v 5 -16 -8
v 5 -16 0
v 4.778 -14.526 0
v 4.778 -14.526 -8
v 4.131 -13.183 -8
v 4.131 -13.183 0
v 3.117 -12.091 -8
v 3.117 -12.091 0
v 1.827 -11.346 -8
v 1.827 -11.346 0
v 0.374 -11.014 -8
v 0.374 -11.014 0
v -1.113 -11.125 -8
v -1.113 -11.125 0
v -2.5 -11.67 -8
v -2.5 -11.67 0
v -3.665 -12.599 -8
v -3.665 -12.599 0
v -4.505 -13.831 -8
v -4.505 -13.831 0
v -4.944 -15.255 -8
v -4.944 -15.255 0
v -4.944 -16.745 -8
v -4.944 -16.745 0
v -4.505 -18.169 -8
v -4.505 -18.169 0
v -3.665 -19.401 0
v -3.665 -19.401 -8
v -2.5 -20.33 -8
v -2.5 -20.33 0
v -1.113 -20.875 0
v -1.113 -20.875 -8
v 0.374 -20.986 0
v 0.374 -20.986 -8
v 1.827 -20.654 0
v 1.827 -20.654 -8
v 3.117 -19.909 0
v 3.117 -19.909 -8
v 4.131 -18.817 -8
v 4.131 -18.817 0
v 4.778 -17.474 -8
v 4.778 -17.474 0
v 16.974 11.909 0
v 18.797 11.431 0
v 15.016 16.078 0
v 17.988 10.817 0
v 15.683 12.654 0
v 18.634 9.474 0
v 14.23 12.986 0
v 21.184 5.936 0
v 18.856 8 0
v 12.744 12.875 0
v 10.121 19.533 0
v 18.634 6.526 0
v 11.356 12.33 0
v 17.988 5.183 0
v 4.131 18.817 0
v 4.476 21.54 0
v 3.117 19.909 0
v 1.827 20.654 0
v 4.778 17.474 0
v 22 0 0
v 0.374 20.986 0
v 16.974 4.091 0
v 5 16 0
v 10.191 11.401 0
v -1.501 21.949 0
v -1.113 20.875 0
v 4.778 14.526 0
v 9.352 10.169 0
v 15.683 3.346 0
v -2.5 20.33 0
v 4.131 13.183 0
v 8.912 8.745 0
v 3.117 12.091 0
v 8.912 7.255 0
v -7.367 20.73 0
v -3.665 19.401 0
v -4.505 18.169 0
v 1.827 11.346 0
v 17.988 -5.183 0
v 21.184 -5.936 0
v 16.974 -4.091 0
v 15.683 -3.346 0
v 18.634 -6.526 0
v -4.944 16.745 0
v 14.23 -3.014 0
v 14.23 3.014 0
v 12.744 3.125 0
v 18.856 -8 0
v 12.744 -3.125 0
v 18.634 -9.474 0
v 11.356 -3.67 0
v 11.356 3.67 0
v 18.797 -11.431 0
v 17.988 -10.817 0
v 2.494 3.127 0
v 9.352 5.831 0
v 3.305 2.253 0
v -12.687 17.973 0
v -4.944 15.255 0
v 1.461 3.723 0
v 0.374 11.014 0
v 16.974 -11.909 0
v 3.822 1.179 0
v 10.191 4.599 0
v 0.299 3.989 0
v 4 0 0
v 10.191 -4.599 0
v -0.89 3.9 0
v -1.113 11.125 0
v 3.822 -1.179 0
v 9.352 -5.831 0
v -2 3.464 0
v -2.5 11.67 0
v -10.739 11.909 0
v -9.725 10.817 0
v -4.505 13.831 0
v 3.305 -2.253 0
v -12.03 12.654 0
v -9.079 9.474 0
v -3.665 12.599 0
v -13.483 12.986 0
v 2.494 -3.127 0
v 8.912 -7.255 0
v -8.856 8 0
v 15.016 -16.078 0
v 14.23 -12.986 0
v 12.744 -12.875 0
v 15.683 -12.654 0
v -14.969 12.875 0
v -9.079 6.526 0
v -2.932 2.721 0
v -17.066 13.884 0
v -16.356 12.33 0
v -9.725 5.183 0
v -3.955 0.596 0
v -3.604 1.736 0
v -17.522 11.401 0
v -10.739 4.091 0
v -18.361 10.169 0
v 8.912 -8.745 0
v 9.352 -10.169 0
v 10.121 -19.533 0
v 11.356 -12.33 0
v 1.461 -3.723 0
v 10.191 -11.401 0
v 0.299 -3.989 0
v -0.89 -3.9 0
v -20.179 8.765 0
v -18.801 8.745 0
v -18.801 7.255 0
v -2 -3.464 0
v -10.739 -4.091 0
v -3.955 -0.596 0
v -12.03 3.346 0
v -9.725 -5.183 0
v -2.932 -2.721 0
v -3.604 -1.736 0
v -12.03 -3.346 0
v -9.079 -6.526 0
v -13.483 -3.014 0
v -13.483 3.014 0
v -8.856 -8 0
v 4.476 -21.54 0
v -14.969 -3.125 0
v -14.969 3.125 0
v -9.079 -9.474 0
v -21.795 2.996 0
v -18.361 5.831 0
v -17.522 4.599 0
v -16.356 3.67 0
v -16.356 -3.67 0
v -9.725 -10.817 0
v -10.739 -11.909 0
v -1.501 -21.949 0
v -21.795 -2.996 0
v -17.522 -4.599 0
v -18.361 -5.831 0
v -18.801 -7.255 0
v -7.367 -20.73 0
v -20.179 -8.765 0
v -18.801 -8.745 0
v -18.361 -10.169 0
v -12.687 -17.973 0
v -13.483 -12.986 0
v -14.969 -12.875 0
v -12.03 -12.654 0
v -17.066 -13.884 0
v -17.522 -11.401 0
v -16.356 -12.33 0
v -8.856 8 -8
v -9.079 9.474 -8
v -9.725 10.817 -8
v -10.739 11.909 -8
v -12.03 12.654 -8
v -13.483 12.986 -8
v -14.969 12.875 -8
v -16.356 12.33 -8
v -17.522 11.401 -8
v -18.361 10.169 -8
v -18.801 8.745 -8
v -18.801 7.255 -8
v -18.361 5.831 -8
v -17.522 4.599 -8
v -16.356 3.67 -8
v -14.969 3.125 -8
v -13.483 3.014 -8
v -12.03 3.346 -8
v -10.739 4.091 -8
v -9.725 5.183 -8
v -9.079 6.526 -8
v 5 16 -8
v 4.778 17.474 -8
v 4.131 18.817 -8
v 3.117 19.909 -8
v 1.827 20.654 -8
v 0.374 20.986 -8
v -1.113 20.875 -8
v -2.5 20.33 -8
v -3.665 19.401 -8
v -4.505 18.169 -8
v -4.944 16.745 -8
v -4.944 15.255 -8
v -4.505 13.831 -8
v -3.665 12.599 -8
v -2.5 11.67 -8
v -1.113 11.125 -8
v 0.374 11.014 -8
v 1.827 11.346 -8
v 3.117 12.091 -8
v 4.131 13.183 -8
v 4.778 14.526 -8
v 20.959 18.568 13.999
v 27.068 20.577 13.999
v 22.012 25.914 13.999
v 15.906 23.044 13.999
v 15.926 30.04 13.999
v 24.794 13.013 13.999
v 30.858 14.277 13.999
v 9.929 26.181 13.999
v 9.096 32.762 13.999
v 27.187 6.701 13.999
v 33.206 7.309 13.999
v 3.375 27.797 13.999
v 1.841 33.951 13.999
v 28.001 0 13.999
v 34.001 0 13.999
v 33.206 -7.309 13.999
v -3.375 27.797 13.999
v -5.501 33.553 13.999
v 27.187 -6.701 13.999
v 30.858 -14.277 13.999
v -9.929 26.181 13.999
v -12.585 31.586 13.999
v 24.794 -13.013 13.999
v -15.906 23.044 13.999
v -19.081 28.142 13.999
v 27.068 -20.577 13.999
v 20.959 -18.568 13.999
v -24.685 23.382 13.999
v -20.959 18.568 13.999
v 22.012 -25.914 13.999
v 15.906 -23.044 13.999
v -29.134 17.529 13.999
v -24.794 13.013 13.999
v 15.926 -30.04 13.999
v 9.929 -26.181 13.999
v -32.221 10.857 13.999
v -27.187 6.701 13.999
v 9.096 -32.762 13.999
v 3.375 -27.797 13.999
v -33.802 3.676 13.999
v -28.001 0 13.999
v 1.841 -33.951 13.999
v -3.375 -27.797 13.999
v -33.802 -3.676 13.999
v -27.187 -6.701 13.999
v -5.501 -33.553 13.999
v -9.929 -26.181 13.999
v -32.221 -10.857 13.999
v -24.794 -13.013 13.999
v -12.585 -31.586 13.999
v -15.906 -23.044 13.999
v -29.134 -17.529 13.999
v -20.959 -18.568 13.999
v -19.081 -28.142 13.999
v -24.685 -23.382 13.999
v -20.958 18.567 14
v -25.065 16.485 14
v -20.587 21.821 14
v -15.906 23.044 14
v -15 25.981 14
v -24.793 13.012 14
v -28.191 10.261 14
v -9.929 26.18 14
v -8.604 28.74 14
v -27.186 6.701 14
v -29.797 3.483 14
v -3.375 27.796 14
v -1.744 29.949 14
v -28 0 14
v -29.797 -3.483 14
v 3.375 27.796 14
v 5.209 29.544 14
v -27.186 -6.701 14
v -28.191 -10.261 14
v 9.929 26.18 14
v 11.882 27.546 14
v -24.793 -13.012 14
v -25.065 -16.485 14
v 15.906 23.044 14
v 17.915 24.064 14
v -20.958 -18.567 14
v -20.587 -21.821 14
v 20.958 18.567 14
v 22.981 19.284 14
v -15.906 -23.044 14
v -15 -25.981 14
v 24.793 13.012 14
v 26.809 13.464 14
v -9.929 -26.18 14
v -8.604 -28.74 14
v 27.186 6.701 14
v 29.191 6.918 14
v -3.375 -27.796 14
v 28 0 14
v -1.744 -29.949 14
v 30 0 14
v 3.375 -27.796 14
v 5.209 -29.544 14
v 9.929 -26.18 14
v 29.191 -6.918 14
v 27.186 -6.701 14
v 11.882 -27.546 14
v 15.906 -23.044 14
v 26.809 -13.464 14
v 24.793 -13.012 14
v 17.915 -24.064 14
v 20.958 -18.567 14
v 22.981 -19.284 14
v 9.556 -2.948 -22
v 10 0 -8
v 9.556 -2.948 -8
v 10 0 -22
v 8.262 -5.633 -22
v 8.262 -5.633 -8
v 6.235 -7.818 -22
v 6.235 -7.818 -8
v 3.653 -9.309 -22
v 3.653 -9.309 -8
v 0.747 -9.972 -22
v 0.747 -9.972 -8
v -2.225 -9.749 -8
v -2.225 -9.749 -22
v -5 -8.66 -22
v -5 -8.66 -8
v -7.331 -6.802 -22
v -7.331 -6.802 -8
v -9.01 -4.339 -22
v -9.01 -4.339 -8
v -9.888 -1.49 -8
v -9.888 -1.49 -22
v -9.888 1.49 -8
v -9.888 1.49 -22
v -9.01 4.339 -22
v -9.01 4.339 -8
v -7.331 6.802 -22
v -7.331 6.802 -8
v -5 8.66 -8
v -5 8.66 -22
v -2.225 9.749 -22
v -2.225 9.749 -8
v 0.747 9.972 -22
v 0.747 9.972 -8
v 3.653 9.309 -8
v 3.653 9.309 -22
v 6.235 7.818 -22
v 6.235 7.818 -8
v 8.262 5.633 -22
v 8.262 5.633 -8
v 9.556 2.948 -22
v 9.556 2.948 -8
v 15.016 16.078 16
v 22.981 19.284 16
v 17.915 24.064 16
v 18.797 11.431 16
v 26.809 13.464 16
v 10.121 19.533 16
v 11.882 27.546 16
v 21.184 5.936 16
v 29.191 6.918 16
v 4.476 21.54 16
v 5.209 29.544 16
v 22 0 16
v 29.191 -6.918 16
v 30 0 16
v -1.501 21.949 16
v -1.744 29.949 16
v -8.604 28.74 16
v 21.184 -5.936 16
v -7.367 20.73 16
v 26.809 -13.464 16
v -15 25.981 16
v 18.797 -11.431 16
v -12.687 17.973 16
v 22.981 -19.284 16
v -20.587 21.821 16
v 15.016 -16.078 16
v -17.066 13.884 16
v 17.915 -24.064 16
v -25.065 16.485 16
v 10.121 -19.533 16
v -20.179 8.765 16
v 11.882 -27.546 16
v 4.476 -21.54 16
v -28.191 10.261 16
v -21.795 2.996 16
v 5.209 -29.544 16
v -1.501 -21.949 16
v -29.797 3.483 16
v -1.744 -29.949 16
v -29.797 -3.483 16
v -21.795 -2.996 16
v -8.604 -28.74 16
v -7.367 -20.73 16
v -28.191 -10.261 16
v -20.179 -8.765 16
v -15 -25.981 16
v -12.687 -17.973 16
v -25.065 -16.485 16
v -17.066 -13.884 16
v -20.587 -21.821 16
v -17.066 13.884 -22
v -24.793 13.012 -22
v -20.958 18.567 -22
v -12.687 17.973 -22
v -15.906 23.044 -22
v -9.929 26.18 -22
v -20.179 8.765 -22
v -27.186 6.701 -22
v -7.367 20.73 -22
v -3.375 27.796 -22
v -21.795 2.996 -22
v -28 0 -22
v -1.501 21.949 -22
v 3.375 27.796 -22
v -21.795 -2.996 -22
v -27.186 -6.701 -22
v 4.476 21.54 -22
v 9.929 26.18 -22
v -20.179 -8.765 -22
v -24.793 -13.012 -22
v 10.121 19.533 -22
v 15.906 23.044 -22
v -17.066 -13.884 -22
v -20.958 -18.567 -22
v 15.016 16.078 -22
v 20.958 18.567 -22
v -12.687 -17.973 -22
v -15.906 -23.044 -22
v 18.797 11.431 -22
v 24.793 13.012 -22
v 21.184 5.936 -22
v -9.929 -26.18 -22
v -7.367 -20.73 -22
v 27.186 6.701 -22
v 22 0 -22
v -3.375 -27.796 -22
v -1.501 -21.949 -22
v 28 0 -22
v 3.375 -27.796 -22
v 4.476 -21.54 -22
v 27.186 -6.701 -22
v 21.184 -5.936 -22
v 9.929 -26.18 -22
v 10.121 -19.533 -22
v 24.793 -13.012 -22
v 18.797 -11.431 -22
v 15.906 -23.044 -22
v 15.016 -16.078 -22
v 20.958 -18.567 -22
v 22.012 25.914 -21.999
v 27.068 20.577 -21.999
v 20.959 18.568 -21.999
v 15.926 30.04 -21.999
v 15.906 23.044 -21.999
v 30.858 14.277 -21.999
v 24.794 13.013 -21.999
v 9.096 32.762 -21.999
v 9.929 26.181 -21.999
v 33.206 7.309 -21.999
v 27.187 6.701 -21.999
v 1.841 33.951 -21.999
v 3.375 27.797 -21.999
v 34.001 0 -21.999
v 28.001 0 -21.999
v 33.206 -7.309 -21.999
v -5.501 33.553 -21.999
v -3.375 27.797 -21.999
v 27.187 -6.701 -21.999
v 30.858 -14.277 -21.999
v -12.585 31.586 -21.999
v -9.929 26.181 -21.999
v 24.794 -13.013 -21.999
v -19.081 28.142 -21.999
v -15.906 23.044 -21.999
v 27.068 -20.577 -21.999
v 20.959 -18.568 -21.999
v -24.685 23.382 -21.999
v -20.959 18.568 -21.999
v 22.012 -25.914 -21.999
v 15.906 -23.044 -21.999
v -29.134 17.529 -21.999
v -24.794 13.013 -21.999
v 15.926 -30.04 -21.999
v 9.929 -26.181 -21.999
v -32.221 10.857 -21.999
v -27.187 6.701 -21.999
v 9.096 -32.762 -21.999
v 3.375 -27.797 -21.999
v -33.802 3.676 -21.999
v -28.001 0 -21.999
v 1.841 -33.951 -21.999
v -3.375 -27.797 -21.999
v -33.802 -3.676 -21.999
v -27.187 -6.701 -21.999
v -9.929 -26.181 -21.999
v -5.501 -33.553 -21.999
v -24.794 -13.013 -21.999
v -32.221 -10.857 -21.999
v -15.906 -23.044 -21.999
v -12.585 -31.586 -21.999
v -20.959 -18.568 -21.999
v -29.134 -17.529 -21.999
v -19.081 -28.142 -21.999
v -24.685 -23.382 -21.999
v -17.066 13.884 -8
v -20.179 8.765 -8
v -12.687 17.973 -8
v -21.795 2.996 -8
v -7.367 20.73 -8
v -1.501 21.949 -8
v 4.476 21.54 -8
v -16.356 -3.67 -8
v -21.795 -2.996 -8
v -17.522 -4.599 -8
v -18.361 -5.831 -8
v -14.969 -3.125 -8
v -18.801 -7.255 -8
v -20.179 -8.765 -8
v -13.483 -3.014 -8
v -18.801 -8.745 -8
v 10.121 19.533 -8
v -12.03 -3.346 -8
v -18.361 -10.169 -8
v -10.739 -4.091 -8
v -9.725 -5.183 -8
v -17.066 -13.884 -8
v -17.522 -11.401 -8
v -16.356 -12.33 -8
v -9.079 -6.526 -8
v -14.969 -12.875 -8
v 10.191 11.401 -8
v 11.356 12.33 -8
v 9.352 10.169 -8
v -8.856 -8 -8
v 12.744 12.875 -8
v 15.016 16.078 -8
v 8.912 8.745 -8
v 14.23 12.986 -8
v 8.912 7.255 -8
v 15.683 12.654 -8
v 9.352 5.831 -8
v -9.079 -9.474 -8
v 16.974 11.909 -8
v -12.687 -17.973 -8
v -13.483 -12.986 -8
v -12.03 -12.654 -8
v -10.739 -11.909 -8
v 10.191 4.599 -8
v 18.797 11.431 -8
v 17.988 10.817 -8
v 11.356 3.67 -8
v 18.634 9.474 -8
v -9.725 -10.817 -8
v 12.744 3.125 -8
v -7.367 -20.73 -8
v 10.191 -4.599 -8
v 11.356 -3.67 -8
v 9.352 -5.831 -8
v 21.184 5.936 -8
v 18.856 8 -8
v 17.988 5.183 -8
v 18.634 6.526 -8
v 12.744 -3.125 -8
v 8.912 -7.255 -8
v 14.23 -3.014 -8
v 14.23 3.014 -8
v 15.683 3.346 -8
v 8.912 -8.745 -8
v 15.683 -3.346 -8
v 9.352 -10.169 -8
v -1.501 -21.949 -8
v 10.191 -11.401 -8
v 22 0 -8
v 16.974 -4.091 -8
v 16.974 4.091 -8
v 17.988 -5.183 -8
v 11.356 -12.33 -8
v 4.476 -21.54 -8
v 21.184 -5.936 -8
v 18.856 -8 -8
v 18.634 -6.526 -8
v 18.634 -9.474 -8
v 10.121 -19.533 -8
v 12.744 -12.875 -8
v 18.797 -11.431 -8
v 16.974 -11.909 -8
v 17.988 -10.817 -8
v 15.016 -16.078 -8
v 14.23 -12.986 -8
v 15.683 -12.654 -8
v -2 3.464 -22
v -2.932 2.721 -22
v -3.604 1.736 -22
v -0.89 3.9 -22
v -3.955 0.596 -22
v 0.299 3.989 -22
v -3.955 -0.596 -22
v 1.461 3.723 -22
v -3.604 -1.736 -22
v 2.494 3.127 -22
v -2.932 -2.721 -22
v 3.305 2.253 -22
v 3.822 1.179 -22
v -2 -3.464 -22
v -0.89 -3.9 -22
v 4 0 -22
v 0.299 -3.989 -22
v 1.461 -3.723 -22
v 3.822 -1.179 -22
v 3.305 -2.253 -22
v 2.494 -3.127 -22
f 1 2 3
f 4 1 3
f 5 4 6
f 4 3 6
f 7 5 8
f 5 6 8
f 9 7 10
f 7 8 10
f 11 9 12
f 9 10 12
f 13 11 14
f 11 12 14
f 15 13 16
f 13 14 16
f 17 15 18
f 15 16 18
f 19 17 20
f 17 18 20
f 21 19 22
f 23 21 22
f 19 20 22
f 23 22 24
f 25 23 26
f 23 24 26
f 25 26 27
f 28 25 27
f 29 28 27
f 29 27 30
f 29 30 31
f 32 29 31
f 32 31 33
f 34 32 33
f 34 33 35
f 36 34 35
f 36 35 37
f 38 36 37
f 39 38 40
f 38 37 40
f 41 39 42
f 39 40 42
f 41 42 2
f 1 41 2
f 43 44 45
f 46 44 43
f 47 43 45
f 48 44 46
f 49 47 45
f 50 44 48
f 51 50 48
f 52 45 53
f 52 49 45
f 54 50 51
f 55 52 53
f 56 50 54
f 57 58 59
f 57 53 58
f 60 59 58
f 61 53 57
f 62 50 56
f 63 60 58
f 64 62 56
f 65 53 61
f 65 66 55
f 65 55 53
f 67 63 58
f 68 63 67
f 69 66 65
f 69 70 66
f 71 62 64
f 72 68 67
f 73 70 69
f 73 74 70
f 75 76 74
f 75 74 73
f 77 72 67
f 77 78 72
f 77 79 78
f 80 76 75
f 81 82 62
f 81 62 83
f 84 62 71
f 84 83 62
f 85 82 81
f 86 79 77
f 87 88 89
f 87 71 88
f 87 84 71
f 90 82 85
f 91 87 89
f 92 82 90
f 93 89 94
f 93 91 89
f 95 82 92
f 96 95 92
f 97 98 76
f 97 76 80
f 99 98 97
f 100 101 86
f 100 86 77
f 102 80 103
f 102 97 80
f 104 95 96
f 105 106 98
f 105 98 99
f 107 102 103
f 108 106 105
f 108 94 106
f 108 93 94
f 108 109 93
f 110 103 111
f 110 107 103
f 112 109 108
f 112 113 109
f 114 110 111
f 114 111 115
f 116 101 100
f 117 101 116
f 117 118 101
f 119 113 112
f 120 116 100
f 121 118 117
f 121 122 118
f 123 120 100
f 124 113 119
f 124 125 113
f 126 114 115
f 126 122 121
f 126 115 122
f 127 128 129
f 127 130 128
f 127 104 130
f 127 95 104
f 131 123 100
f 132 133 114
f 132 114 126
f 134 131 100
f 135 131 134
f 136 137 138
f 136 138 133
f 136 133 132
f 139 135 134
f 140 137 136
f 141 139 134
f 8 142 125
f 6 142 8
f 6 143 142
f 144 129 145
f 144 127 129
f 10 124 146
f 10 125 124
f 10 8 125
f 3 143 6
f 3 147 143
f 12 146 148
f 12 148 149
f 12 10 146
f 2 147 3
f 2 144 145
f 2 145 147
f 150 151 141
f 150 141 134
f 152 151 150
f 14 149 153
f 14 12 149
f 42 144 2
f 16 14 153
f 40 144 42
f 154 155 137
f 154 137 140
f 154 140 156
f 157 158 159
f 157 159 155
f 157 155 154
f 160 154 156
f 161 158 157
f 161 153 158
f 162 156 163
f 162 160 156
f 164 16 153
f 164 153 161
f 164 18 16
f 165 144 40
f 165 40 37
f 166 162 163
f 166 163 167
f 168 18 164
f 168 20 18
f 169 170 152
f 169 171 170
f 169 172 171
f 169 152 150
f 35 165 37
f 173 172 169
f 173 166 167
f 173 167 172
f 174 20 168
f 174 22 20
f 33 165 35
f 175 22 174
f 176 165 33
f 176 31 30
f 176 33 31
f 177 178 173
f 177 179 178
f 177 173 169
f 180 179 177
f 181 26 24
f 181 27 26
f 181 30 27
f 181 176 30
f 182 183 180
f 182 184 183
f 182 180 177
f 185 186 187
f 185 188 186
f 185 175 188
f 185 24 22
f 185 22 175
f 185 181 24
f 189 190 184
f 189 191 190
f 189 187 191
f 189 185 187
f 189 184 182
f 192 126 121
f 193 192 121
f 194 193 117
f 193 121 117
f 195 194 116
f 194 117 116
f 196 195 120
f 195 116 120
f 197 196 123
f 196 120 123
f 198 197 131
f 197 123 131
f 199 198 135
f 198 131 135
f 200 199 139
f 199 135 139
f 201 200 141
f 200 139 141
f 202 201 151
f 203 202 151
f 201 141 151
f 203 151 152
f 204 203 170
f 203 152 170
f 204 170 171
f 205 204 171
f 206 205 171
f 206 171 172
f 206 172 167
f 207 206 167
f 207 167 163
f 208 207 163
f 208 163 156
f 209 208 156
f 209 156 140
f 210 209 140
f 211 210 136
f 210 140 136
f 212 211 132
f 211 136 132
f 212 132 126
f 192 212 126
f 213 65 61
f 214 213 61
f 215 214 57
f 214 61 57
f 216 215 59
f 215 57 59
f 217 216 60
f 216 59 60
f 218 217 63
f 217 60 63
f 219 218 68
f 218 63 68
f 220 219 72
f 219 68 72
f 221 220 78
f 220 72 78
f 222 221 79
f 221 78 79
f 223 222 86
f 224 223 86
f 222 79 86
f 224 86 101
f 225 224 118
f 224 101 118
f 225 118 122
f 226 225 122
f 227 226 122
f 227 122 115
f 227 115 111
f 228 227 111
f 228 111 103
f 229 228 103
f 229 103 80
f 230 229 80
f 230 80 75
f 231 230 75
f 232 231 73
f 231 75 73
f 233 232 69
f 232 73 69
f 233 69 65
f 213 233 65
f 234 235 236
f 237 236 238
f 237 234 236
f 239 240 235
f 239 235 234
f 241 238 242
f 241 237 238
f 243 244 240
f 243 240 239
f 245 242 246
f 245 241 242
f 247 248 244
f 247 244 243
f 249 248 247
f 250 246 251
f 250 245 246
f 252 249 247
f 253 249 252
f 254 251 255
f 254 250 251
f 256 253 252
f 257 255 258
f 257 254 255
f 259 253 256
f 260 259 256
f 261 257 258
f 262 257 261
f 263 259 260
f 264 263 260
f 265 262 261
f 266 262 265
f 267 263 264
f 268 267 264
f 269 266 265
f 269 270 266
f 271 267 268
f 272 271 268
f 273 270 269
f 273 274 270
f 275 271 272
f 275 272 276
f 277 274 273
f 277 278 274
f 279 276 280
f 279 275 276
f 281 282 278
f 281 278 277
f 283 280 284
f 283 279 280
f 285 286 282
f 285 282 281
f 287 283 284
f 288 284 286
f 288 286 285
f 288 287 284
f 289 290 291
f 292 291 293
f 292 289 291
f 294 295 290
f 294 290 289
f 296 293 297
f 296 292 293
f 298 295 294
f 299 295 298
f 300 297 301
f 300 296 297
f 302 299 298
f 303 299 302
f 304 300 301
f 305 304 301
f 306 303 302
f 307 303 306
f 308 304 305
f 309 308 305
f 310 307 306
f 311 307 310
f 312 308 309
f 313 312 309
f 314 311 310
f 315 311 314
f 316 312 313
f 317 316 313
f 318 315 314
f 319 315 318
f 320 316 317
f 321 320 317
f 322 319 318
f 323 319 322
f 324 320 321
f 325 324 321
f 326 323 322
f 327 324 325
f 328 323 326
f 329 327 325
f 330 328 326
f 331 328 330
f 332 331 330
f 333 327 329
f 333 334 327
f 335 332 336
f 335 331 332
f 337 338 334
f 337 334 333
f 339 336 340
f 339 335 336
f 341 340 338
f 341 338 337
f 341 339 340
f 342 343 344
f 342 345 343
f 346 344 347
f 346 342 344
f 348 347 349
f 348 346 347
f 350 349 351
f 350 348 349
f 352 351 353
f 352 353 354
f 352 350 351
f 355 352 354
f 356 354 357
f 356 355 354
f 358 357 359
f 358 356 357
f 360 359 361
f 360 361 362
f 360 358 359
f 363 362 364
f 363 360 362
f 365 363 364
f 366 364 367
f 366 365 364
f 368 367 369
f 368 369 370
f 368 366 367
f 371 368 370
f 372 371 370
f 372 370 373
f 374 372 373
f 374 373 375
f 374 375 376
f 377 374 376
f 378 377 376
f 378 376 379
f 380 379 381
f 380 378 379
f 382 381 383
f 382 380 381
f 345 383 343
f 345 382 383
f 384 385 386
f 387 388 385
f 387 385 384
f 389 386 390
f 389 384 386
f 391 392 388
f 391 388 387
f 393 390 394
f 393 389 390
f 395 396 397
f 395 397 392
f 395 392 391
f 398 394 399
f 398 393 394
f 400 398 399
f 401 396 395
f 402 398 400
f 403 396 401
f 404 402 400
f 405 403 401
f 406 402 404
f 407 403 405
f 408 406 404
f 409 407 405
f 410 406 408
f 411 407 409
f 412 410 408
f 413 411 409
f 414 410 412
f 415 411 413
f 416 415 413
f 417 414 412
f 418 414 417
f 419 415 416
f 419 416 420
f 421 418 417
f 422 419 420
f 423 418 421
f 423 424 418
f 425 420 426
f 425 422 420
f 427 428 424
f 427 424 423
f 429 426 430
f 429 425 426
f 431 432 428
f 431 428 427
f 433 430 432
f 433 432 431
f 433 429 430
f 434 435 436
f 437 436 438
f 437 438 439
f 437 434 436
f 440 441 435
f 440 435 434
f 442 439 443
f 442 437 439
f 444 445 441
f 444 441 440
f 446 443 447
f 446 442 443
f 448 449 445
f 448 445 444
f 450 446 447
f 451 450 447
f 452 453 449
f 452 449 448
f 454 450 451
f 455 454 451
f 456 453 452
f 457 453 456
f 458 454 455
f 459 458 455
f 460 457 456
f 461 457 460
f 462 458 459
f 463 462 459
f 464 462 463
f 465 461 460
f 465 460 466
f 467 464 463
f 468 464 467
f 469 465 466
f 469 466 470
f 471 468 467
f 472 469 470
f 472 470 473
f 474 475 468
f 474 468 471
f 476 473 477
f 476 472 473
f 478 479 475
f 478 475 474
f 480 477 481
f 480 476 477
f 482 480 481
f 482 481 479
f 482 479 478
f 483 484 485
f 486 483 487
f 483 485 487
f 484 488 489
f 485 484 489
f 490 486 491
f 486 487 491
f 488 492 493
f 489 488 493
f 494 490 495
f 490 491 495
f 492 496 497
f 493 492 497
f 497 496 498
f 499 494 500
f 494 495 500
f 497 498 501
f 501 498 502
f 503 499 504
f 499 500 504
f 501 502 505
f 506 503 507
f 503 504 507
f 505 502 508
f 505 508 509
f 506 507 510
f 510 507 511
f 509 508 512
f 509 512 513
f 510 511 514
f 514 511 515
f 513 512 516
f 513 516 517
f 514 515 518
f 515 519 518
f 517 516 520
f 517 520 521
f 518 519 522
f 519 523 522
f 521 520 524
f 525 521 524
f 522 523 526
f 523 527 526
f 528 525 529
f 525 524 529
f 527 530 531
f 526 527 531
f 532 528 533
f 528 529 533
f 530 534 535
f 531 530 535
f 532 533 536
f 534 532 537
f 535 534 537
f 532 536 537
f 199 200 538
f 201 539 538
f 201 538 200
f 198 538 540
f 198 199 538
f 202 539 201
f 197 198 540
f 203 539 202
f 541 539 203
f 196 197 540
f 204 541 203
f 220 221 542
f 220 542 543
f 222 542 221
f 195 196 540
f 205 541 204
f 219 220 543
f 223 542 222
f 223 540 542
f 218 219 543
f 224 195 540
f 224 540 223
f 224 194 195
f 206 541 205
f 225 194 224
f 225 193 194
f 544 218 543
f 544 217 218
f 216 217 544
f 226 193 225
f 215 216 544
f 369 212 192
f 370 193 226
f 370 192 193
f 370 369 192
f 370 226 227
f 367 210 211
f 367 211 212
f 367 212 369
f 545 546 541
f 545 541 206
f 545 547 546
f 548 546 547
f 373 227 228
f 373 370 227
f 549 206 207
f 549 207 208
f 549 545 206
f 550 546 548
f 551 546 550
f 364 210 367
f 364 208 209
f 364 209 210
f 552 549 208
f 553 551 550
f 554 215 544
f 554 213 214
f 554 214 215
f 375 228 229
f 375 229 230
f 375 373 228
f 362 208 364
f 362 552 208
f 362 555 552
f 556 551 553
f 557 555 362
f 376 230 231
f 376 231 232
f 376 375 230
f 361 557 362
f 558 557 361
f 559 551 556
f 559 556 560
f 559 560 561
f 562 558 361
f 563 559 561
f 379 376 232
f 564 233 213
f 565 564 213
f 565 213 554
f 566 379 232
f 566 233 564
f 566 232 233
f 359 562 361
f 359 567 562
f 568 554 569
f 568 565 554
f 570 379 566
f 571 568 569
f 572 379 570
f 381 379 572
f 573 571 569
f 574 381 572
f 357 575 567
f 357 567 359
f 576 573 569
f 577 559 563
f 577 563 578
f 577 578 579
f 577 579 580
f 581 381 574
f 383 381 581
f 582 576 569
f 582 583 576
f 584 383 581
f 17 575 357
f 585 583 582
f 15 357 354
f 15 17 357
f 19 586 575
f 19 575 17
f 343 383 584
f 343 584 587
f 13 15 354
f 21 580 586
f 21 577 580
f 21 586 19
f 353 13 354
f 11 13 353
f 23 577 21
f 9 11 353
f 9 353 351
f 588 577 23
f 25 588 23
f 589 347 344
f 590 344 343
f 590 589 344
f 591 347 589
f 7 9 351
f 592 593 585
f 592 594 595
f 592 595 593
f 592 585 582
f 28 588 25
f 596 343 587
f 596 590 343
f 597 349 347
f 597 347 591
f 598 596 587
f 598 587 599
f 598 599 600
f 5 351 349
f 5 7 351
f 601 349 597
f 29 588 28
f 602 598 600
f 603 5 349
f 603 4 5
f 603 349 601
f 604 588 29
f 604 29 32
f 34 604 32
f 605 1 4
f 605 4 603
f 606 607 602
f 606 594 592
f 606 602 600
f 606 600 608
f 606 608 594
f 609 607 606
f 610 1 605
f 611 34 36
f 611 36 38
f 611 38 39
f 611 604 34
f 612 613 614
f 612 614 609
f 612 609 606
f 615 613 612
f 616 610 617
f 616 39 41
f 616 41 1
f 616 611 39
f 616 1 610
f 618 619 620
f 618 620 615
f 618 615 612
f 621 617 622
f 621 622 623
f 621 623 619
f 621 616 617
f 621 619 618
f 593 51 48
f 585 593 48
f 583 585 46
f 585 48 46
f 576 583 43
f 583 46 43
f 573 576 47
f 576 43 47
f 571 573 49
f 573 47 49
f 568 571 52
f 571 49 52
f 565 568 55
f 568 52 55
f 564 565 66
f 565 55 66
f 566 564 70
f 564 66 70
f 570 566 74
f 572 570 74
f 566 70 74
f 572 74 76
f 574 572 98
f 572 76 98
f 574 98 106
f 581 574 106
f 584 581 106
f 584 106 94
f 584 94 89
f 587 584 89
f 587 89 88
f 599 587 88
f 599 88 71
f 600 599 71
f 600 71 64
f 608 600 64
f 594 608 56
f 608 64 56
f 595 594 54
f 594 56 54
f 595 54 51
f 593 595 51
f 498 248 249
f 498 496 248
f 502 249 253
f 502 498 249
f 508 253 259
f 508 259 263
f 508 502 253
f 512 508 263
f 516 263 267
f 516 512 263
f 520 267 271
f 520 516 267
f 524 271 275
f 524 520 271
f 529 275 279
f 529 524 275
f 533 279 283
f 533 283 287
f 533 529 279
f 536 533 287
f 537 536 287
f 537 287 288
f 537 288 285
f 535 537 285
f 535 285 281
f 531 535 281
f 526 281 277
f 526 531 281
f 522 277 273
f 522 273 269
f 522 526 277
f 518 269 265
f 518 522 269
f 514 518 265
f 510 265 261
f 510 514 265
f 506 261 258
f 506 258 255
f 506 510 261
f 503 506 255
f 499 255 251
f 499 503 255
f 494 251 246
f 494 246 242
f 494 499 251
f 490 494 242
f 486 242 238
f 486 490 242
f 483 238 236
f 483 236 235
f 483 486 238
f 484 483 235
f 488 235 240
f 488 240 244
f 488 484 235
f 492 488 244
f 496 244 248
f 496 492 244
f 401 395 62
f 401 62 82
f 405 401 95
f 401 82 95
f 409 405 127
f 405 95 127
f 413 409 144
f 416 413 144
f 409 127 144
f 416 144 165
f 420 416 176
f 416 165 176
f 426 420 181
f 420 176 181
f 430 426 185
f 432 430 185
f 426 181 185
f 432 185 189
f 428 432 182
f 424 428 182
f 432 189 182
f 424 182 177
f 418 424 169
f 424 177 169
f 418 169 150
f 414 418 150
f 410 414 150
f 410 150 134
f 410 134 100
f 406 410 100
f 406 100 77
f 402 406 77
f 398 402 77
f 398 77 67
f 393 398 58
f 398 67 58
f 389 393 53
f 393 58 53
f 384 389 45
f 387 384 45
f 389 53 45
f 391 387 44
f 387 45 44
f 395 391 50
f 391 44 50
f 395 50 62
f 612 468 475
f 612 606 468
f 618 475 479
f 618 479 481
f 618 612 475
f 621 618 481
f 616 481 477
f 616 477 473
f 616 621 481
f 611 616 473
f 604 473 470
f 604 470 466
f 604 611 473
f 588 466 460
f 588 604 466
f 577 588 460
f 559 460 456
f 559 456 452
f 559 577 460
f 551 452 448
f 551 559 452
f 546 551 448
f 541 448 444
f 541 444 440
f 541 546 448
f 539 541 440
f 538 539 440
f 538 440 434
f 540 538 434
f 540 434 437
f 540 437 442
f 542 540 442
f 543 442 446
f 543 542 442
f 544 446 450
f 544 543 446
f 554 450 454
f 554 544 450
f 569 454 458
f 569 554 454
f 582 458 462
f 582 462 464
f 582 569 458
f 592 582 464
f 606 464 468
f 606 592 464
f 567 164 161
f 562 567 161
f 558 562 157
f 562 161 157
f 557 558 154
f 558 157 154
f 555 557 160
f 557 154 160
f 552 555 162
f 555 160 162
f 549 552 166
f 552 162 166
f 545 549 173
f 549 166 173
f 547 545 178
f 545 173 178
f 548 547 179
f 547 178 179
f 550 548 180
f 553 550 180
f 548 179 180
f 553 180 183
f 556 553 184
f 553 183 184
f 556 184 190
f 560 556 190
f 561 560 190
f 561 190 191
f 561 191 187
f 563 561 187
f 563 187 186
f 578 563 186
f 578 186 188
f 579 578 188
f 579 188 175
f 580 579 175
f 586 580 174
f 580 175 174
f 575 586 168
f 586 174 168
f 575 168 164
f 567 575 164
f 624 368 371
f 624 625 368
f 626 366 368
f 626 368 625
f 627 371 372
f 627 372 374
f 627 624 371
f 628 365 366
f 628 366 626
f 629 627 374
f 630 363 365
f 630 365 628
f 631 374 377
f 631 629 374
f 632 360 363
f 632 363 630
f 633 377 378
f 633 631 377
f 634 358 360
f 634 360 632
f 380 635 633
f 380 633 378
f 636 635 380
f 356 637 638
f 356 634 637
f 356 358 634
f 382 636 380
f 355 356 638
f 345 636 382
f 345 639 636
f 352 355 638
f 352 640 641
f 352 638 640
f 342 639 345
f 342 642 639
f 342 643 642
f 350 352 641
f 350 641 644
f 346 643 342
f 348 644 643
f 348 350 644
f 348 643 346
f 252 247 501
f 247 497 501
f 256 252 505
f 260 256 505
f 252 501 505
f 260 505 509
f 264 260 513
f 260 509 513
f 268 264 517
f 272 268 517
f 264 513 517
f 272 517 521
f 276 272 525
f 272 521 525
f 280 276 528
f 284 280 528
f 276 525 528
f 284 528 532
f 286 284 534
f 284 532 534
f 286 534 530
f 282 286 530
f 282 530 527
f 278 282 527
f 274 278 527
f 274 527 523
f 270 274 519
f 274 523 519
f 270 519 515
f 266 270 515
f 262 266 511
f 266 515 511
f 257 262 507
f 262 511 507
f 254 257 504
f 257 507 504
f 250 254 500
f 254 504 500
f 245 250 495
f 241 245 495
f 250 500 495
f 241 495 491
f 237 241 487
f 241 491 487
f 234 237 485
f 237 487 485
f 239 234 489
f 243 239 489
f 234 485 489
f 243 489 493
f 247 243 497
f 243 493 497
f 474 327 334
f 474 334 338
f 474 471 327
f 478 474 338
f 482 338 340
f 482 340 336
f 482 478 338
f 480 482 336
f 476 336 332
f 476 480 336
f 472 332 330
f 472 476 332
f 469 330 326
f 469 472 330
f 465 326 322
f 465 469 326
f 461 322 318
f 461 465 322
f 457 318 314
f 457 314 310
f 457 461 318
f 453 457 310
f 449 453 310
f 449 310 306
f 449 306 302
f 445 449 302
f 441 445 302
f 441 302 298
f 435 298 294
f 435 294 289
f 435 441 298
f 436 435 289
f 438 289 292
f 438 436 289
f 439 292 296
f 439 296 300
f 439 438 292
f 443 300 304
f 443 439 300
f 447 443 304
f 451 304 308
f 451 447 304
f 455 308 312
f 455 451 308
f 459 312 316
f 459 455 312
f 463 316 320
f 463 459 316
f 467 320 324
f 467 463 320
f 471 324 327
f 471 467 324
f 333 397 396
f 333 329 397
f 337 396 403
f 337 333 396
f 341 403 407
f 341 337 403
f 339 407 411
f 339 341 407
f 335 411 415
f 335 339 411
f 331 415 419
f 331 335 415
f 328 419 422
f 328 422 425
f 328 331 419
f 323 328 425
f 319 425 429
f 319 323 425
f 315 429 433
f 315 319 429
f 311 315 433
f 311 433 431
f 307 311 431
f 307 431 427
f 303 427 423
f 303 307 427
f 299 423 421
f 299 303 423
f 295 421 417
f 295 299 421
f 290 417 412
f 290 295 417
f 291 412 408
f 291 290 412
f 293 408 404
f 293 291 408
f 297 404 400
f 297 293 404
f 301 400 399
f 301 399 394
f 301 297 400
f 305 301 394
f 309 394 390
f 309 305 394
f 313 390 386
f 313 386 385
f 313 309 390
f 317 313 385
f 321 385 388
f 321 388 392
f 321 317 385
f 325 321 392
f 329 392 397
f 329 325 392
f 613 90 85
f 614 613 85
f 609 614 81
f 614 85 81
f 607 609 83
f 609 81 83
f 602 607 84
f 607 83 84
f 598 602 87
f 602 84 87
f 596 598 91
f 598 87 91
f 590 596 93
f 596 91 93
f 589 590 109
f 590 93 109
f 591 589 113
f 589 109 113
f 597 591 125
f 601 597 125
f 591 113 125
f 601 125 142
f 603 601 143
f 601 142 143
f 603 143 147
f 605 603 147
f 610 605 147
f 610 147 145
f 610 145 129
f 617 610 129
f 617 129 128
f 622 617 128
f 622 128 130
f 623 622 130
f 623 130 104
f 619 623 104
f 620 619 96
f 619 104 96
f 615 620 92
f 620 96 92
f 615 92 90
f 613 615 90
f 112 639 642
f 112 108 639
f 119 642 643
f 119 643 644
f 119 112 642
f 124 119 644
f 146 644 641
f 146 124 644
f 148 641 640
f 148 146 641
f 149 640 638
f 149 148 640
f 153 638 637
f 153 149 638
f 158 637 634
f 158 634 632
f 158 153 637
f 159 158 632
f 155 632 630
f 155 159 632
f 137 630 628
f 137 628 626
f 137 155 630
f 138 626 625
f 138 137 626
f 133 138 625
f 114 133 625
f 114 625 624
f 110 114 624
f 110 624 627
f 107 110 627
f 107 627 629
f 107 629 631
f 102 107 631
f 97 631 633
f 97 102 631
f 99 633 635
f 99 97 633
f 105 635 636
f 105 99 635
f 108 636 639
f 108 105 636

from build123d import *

# Parameters (mm, degrees)
SKETCH2_R          = 5
CUT_EXTRUDE1_DEPTH = 8
SKETCH3_W          = 35.998
SKETCH3_H          = 6


with BuildPart() as part:
    # Sketch1 → Revolve1 (revolve)
    with BuildSketch(Plane(origin=(0, 0, 0), x_dir=(0, 0, -1), z_dir=(1, 0, 0)), mode=Mode.PRIVATE) as revolve1_sk:
        Polygon((0, 4), (0, 22), (-14, 22), (-16, 22), (-16, 30), (-14, 30), (-14, 28), (22, 28), (22, 22), (8, 22), (8, 10), (22, 10), (22, 4), align=None)
    revolve(revolve1_sk.sketch.rotate(Axis((0, 0, 0), (0, 0, -1)), 90), axis=Axis((0, 0, 0), (0, 0, -1)))

    # Sketch2 → Cut-Extrude1 (cut)
    with BuildSketch(Plane.XY):
        with Locations((0, 16)):
            Circle(SKETCH2_R)
        with Locations((13.856406461, 8)):
            Circle(SKETCH2_R)
        with Locations((13.856406461, -8)):
            Circle(SKETCH2_R)
        with Locations((0, -16)):
            Circle(SKETCH2_R)
        with Locations((-13.856406461, -8)):
            Circle(SKETCH2_R)
        with Locations((-13.856406461, 8)):
            Circle(SKETCH2_R)
    extrude(amount=-CUT_EXTRUDE1_DEPTH, mode=Mode.SUBTRACT)


with BuildPart() as body_2:
    # Sketch3 → Revolve2 (revolve)
    with BuildSketch(Plane(origin=(0, 0, 0), x_dir=(0, 0, -1), z_dir=(1, 0, 0)), mode=Mode.PRIVATE) as revolve2_sk:
        with Locations((4, 31.001)):
            Rectangle(SKETCH3_W, SKETCH3_H)
    revolve(revolve2_sk.sketch.rotate(Axis((0, 0, 0), (0, 0, -1)), 90), axis=Axis((0, 0, 0), (0, 0, -1)))


solid = Compound([part.part, body_2.part])
